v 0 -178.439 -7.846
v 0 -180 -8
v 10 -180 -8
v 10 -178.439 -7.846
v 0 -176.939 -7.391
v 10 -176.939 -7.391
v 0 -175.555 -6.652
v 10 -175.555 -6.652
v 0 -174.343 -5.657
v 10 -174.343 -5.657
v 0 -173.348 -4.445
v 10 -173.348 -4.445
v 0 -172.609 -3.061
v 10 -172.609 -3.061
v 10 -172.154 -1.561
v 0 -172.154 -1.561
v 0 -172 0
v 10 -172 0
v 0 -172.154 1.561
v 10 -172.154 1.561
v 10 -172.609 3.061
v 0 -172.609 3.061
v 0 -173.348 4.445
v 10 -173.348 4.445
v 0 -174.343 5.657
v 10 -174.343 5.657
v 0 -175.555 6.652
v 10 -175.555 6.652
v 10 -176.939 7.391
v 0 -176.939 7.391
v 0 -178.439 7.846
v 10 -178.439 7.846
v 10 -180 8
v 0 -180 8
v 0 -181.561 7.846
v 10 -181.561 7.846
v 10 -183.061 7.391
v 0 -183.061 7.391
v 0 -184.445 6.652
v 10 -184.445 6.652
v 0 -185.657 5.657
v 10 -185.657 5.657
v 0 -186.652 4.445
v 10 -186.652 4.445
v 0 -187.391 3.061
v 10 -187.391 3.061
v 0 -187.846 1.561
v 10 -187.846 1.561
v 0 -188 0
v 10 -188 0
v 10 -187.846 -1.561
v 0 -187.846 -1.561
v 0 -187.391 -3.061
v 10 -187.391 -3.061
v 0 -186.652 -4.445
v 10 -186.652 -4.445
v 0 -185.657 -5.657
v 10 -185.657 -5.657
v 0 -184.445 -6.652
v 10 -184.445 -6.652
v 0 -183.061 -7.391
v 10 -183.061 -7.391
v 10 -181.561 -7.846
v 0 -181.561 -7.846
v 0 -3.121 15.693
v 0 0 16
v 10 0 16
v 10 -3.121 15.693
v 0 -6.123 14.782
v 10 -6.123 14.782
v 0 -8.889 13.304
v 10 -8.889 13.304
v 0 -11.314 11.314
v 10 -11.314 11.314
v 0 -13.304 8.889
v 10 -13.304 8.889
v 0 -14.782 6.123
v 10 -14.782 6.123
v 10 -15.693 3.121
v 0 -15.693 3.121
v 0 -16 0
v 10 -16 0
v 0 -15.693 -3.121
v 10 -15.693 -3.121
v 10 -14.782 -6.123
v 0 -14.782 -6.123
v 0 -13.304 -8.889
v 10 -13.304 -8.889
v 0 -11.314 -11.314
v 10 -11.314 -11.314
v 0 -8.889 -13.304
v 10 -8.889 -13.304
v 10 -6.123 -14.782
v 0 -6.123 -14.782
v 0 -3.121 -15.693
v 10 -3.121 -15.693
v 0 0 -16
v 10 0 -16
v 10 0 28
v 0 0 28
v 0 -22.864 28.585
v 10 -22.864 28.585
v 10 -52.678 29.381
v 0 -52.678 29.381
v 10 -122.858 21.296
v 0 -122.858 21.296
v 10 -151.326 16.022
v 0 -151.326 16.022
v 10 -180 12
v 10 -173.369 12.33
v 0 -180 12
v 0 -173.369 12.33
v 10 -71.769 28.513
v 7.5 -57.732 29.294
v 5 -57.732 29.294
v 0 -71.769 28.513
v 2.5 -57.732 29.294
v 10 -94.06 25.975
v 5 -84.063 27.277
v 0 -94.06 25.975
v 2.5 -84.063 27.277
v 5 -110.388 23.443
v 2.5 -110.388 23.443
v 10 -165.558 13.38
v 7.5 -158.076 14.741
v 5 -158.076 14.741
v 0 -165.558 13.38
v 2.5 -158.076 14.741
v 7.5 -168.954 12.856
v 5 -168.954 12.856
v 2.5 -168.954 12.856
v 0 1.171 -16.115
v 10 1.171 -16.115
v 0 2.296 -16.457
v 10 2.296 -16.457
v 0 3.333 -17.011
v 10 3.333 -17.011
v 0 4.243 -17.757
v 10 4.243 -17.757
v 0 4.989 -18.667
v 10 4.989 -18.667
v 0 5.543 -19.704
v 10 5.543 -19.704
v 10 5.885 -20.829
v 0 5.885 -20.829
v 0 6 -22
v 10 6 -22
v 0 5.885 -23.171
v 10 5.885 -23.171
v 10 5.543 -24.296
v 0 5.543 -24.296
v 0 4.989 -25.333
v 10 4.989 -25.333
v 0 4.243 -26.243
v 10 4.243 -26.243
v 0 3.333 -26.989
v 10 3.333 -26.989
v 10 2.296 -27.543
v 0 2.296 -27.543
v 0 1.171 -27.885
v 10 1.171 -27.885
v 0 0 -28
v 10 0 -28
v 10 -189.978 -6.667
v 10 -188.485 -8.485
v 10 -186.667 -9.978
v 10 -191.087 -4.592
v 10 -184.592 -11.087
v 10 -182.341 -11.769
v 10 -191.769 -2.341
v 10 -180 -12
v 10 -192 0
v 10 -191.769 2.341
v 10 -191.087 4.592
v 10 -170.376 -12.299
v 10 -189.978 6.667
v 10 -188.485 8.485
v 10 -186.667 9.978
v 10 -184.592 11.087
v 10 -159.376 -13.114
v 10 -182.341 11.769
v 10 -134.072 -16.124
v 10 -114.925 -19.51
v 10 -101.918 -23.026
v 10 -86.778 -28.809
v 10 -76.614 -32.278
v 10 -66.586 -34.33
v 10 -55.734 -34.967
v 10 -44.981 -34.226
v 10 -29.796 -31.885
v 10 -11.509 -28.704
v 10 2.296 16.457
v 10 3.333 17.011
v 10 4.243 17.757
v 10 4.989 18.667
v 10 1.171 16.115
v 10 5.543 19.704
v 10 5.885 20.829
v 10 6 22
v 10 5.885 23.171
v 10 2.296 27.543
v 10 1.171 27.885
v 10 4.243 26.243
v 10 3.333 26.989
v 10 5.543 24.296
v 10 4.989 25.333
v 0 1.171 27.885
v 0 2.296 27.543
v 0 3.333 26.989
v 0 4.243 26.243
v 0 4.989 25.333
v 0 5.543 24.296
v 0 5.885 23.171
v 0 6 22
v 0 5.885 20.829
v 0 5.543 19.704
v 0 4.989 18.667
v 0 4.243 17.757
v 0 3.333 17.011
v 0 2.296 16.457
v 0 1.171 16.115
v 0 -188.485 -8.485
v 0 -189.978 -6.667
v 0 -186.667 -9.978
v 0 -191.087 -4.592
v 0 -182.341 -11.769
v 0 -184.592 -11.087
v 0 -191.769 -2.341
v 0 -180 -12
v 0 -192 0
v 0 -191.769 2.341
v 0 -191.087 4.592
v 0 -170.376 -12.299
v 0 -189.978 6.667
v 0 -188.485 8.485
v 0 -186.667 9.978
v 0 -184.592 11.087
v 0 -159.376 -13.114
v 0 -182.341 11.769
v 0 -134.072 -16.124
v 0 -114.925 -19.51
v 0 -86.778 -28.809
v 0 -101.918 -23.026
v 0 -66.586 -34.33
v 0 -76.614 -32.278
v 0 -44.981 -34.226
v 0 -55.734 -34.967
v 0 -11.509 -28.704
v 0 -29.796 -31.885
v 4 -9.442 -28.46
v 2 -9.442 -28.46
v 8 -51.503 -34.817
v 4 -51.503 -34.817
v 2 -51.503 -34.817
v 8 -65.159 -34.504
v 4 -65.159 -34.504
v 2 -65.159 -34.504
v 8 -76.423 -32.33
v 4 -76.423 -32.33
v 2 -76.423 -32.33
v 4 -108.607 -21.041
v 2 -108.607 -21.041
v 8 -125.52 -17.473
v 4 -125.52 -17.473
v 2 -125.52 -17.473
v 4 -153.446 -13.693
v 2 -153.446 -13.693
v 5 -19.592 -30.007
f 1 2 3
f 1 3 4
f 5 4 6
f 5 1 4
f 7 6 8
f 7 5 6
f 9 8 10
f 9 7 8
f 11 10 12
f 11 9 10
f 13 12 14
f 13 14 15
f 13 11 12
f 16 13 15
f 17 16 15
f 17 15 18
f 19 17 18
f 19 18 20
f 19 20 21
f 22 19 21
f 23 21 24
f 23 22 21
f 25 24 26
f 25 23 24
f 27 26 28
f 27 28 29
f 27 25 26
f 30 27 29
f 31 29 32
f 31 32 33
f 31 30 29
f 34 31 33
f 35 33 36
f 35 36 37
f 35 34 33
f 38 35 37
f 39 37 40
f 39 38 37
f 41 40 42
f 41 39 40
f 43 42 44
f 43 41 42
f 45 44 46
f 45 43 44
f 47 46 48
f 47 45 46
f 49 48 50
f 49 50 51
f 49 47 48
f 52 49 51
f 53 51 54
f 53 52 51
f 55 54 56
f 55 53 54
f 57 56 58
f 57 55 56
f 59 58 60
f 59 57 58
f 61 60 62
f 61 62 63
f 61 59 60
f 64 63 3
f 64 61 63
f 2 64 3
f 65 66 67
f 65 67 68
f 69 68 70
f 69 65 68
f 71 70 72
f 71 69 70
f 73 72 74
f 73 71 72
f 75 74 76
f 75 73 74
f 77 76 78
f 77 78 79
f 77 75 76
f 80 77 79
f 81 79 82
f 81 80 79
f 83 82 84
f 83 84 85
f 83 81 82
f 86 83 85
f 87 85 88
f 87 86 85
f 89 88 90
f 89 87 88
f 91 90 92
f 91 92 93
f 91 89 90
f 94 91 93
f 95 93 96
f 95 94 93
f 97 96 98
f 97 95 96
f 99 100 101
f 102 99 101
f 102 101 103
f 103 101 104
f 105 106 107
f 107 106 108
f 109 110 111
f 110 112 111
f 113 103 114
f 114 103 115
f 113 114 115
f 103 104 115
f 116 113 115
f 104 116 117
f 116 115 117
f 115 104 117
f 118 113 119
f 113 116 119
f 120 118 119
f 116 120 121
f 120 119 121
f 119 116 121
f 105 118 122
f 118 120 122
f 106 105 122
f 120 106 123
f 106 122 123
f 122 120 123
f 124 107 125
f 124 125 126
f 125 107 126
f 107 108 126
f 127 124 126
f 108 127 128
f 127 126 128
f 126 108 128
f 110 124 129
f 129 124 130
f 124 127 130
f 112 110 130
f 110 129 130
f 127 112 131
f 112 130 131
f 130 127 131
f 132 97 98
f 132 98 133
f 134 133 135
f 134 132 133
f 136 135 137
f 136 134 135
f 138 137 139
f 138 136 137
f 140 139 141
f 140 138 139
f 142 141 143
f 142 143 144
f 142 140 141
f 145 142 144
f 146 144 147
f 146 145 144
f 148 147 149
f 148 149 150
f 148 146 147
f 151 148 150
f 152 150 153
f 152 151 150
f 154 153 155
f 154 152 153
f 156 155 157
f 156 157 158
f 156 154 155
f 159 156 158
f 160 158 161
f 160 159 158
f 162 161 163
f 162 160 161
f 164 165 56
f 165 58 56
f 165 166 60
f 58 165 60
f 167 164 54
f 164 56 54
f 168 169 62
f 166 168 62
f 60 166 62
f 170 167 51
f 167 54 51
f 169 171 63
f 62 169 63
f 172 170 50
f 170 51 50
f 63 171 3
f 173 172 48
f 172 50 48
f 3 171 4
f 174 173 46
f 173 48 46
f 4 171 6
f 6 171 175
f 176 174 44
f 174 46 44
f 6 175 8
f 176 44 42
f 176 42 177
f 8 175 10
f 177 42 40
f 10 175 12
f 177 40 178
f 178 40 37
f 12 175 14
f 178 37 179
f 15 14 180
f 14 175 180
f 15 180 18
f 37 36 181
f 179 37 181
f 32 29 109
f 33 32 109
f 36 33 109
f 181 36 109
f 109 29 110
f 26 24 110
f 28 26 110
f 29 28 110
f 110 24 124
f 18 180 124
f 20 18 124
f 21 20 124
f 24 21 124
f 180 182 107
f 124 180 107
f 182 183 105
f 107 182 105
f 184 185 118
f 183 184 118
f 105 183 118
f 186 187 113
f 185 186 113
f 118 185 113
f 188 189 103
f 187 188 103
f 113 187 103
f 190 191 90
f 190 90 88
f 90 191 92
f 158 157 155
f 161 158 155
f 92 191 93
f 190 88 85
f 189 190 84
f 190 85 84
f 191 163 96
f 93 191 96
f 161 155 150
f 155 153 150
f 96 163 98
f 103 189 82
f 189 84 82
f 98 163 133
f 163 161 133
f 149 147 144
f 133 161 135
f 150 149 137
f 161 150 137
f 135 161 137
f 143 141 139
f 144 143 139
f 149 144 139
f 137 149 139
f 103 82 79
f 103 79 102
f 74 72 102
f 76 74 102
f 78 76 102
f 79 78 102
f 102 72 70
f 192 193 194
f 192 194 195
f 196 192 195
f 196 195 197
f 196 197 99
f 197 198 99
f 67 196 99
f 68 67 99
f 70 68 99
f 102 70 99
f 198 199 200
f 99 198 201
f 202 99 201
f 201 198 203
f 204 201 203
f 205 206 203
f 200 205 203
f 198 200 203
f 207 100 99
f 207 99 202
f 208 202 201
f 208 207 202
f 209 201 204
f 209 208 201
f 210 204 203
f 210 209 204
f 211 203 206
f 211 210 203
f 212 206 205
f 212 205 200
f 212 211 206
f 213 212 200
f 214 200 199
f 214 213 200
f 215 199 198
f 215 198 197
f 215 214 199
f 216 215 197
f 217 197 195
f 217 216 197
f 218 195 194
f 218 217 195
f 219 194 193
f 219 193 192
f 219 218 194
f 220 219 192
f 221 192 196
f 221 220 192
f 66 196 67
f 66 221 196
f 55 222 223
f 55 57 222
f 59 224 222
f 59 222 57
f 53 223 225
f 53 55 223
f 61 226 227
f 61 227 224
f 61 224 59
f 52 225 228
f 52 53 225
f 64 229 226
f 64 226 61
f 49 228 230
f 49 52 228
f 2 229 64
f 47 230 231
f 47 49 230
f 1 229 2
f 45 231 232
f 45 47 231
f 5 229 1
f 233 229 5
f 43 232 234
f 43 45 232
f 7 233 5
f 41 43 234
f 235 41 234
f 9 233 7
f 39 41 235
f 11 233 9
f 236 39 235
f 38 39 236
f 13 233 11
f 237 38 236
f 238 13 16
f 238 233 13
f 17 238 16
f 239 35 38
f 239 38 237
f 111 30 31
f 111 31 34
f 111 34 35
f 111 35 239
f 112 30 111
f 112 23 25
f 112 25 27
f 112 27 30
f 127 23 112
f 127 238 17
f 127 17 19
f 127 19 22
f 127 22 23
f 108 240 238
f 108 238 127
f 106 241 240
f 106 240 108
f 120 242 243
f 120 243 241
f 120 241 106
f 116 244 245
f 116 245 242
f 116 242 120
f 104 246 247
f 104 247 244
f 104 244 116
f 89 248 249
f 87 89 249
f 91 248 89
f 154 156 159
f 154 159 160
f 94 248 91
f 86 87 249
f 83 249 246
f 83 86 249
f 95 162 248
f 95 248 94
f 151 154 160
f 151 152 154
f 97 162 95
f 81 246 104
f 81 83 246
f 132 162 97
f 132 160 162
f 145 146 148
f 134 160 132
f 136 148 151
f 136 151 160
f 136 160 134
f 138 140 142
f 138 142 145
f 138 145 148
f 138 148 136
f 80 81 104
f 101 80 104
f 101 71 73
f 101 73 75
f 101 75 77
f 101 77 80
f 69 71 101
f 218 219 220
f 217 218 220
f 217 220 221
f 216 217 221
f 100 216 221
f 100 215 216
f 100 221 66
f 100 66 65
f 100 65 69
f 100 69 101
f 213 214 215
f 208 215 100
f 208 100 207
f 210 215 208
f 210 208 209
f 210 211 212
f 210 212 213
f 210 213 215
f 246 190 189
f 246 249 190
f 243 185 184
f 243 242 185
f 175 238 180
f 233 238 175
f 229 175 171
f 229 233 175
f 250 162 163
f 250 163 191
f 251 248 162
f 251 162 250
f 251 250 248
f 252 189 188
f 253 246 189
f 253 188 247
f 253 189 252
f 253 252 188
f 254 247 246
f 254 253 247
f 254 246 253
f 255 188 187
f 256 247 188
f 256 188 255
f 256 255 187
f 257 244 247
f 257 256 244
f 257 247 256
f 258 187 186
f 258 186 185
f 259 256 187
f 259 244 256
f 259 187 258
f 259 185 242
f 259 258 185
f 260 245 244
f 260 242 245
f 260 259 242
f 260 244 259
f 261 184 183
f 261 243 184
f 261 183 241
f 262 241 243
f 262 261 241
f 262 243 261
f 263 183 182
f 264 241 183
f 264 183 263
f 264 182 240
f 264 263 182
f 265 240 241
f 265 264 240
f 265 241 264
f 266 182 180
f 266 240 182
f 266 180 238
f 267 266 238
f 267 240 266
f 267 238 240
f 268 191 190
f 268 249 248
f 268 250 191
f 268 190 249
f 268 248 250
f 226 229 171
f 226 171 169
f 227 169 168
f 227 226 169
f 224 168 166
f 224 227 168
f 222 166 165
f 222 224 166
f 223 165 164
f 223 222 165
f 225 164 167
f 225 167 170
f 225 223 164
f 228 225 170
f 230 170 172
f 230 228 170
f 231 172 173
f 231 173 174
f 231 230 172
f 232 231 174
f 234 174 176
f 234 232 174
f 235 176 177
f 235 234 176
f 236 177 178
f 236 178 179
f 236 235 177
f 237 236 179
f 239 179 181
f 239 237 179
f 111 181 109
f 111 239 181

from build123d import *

# Parameters (mm, degrees)
SKETCH1_R           = 8
BOSS_EXTRUDE1_DEPTH = 10


with BuildPart() as part:
    # Sketch1 → Boss-Extrude1 (new body)
    with BuildSketch(Plane(origin=(0, 0, 0), x_dir=(0, 0, -1), z_dir=(1, 0, 0))):
        with BuildLine():
            add(Edge.make_bspline(
                [(28, 0), (28, -7.118899136), (29.32003736, -17.374316549), (39.218709007, -65.18457733), (24.48938936, -94.622041818), (16.83955024, -123.055989281), (12, -165.45650348), (12, -180)],
                knots=[0, 0, 0, 0, 0.084286247, 0.187609719, 0.382215489, 0.5597669, 0.781850651, 0.781850651, 0.781850651, 0.781850651], degree=3))
            ThreePointArc((12, -180), (0, -192), (-12, -180))
            add(Edge.make_bspline(
                [(-28, 0), (-28, -19.841479689), (-31.491847071, -55.945068065), (-24.097890925, -109.086480388), (-16.36971111, -149.426112932), (-12, -172.544928322), (-12, -180)],
                knots=[0, 0, 0, 0, 0.318521568, 0.610749871, 0.878130317, 1, 1, 1, 1], degree=3))
            ThreePointArc((-28, 0), (-22, 6), (-16, 0))
            ThreePointArc((-16, 0), (0, -16), (16, 0))
            ThreePointArc((16, 0), (22, 6), (28, 0))
        make_face()
        with Locations((0, -180)):
            Circle(SKETCH1_R, mode=Mode.SUBTRACT)
    extrude(amount=BOSS_EXTRUDE1_DEPTH)


solid = part.part
